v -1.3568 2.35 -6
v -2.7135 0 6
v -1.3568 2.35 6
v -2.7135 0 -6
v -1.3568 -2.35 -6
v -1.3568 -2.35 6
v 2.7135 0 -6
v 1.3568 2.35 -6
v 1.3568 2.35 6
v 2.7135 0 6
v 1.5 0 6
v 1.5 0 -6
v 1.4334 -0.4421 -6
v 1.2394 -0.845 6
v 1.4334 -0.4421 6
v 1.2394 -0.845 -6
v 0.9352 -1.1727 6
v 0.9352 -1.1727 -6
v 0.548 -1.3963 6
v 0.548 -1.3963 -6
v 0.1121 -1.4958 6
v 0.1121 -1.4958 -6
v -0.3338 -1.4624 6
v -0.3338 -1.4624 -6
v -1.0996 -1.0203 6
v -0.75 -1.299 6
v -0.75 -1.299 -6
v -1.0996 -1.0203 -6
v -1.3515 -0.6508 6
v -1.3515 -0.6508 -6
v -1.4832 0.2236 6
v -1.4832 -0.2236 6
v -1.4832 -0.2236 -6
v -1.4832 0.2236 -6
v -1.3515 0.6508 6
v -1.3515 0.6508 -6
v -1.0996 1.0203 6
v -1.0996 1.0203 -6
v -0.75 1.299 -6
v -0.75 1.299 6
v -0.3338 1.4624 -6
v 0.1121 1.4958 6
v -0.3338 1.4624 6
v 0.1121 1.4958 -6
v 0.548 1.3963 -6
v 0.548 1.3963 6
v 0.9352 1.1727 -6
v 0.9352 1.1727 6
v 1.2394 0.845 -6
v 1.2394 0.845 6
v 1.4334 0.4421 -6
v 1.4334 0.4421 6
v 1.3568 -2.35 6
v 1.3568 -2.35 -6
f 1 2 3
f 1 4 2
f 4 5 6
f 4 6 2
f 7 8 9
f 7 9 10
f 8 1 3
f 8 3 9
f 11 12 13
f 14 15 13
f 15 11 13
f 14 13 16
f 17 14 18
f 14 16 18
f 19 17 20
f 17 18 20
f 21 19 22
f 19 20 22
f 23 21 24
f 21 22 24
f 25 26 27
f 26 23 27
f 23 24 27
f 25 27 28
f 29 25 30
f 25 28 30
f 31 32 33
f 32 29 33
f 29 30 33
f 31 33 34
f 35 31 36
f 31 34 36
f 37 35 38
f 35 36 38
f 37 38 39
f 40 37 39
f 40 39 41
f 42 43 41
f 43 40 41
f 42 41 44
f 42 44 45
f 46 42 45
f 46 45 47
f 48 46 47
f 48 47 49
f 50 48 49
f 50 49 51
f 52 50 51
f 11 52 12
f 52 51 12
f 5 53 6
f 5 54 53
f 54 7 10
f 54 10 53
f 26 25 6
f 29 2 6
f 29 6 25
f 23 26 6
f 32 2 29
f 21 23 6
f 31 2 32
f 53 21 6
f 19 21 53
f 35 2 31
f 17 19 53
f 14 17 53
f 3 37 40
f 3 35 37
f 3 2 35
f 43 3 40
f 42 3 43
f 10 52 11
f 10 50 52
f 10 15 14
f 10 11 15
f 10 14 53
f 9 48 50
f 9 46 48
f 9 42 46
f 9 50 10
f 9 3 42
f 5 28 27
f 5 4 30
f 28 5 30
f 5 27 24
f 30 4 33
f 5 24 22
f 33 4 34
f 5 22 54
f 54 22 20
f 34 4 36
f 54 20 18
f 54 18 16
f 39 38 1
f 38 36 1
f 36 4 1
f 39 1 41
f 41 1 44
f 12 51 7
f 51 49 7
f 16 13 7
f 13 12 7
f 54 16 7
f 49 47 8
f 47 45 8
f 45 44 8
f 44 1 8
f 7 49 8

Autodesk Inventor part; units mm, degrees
ref_plane "YZ Plane" through (0, 0, 0) normal (1, 0, 0) x (0, 1, 0)
ref_plane "XZ Plane" through (0, 0, 0) normal (0, 1, 0) x (-1, 0, 0)
ref_plane "XY Plane" through (0, 0, 0) normal (0, 0, 1) x (1, 0, 0)
sketch "Sketch1" plane through (0, 0, 0) normal (0, 0, 1) x (1, 0, 0)
  line L0 (1.3568, 2.35) -> (2.7135, 0)
  line L1 (2.7135, 0) -> (1.3568, -2.35)
  line L2 (1.3568, -2.35) -> (-1.3568, -2.35)
  line L3 (-1.3568, -2.35) -> (-2.7135, 0)
  line L4 (-2.7135, 0) -> (-1.3568, 2.35)
  line L5 (-1.3568, 2.35) -> (1.3568, 2.35)
  circle A0 centre (0, 0) radius 1.5
  point P0 (0, 2.35)
  dimension "d0" = 4.7
  dimension "d1" = 3
extrude "Extrusion1" add sketch "Sketch1" along normal mid plane 12
properties part number "spacerHex" material "Brass, Soft Yellow, Welded"
